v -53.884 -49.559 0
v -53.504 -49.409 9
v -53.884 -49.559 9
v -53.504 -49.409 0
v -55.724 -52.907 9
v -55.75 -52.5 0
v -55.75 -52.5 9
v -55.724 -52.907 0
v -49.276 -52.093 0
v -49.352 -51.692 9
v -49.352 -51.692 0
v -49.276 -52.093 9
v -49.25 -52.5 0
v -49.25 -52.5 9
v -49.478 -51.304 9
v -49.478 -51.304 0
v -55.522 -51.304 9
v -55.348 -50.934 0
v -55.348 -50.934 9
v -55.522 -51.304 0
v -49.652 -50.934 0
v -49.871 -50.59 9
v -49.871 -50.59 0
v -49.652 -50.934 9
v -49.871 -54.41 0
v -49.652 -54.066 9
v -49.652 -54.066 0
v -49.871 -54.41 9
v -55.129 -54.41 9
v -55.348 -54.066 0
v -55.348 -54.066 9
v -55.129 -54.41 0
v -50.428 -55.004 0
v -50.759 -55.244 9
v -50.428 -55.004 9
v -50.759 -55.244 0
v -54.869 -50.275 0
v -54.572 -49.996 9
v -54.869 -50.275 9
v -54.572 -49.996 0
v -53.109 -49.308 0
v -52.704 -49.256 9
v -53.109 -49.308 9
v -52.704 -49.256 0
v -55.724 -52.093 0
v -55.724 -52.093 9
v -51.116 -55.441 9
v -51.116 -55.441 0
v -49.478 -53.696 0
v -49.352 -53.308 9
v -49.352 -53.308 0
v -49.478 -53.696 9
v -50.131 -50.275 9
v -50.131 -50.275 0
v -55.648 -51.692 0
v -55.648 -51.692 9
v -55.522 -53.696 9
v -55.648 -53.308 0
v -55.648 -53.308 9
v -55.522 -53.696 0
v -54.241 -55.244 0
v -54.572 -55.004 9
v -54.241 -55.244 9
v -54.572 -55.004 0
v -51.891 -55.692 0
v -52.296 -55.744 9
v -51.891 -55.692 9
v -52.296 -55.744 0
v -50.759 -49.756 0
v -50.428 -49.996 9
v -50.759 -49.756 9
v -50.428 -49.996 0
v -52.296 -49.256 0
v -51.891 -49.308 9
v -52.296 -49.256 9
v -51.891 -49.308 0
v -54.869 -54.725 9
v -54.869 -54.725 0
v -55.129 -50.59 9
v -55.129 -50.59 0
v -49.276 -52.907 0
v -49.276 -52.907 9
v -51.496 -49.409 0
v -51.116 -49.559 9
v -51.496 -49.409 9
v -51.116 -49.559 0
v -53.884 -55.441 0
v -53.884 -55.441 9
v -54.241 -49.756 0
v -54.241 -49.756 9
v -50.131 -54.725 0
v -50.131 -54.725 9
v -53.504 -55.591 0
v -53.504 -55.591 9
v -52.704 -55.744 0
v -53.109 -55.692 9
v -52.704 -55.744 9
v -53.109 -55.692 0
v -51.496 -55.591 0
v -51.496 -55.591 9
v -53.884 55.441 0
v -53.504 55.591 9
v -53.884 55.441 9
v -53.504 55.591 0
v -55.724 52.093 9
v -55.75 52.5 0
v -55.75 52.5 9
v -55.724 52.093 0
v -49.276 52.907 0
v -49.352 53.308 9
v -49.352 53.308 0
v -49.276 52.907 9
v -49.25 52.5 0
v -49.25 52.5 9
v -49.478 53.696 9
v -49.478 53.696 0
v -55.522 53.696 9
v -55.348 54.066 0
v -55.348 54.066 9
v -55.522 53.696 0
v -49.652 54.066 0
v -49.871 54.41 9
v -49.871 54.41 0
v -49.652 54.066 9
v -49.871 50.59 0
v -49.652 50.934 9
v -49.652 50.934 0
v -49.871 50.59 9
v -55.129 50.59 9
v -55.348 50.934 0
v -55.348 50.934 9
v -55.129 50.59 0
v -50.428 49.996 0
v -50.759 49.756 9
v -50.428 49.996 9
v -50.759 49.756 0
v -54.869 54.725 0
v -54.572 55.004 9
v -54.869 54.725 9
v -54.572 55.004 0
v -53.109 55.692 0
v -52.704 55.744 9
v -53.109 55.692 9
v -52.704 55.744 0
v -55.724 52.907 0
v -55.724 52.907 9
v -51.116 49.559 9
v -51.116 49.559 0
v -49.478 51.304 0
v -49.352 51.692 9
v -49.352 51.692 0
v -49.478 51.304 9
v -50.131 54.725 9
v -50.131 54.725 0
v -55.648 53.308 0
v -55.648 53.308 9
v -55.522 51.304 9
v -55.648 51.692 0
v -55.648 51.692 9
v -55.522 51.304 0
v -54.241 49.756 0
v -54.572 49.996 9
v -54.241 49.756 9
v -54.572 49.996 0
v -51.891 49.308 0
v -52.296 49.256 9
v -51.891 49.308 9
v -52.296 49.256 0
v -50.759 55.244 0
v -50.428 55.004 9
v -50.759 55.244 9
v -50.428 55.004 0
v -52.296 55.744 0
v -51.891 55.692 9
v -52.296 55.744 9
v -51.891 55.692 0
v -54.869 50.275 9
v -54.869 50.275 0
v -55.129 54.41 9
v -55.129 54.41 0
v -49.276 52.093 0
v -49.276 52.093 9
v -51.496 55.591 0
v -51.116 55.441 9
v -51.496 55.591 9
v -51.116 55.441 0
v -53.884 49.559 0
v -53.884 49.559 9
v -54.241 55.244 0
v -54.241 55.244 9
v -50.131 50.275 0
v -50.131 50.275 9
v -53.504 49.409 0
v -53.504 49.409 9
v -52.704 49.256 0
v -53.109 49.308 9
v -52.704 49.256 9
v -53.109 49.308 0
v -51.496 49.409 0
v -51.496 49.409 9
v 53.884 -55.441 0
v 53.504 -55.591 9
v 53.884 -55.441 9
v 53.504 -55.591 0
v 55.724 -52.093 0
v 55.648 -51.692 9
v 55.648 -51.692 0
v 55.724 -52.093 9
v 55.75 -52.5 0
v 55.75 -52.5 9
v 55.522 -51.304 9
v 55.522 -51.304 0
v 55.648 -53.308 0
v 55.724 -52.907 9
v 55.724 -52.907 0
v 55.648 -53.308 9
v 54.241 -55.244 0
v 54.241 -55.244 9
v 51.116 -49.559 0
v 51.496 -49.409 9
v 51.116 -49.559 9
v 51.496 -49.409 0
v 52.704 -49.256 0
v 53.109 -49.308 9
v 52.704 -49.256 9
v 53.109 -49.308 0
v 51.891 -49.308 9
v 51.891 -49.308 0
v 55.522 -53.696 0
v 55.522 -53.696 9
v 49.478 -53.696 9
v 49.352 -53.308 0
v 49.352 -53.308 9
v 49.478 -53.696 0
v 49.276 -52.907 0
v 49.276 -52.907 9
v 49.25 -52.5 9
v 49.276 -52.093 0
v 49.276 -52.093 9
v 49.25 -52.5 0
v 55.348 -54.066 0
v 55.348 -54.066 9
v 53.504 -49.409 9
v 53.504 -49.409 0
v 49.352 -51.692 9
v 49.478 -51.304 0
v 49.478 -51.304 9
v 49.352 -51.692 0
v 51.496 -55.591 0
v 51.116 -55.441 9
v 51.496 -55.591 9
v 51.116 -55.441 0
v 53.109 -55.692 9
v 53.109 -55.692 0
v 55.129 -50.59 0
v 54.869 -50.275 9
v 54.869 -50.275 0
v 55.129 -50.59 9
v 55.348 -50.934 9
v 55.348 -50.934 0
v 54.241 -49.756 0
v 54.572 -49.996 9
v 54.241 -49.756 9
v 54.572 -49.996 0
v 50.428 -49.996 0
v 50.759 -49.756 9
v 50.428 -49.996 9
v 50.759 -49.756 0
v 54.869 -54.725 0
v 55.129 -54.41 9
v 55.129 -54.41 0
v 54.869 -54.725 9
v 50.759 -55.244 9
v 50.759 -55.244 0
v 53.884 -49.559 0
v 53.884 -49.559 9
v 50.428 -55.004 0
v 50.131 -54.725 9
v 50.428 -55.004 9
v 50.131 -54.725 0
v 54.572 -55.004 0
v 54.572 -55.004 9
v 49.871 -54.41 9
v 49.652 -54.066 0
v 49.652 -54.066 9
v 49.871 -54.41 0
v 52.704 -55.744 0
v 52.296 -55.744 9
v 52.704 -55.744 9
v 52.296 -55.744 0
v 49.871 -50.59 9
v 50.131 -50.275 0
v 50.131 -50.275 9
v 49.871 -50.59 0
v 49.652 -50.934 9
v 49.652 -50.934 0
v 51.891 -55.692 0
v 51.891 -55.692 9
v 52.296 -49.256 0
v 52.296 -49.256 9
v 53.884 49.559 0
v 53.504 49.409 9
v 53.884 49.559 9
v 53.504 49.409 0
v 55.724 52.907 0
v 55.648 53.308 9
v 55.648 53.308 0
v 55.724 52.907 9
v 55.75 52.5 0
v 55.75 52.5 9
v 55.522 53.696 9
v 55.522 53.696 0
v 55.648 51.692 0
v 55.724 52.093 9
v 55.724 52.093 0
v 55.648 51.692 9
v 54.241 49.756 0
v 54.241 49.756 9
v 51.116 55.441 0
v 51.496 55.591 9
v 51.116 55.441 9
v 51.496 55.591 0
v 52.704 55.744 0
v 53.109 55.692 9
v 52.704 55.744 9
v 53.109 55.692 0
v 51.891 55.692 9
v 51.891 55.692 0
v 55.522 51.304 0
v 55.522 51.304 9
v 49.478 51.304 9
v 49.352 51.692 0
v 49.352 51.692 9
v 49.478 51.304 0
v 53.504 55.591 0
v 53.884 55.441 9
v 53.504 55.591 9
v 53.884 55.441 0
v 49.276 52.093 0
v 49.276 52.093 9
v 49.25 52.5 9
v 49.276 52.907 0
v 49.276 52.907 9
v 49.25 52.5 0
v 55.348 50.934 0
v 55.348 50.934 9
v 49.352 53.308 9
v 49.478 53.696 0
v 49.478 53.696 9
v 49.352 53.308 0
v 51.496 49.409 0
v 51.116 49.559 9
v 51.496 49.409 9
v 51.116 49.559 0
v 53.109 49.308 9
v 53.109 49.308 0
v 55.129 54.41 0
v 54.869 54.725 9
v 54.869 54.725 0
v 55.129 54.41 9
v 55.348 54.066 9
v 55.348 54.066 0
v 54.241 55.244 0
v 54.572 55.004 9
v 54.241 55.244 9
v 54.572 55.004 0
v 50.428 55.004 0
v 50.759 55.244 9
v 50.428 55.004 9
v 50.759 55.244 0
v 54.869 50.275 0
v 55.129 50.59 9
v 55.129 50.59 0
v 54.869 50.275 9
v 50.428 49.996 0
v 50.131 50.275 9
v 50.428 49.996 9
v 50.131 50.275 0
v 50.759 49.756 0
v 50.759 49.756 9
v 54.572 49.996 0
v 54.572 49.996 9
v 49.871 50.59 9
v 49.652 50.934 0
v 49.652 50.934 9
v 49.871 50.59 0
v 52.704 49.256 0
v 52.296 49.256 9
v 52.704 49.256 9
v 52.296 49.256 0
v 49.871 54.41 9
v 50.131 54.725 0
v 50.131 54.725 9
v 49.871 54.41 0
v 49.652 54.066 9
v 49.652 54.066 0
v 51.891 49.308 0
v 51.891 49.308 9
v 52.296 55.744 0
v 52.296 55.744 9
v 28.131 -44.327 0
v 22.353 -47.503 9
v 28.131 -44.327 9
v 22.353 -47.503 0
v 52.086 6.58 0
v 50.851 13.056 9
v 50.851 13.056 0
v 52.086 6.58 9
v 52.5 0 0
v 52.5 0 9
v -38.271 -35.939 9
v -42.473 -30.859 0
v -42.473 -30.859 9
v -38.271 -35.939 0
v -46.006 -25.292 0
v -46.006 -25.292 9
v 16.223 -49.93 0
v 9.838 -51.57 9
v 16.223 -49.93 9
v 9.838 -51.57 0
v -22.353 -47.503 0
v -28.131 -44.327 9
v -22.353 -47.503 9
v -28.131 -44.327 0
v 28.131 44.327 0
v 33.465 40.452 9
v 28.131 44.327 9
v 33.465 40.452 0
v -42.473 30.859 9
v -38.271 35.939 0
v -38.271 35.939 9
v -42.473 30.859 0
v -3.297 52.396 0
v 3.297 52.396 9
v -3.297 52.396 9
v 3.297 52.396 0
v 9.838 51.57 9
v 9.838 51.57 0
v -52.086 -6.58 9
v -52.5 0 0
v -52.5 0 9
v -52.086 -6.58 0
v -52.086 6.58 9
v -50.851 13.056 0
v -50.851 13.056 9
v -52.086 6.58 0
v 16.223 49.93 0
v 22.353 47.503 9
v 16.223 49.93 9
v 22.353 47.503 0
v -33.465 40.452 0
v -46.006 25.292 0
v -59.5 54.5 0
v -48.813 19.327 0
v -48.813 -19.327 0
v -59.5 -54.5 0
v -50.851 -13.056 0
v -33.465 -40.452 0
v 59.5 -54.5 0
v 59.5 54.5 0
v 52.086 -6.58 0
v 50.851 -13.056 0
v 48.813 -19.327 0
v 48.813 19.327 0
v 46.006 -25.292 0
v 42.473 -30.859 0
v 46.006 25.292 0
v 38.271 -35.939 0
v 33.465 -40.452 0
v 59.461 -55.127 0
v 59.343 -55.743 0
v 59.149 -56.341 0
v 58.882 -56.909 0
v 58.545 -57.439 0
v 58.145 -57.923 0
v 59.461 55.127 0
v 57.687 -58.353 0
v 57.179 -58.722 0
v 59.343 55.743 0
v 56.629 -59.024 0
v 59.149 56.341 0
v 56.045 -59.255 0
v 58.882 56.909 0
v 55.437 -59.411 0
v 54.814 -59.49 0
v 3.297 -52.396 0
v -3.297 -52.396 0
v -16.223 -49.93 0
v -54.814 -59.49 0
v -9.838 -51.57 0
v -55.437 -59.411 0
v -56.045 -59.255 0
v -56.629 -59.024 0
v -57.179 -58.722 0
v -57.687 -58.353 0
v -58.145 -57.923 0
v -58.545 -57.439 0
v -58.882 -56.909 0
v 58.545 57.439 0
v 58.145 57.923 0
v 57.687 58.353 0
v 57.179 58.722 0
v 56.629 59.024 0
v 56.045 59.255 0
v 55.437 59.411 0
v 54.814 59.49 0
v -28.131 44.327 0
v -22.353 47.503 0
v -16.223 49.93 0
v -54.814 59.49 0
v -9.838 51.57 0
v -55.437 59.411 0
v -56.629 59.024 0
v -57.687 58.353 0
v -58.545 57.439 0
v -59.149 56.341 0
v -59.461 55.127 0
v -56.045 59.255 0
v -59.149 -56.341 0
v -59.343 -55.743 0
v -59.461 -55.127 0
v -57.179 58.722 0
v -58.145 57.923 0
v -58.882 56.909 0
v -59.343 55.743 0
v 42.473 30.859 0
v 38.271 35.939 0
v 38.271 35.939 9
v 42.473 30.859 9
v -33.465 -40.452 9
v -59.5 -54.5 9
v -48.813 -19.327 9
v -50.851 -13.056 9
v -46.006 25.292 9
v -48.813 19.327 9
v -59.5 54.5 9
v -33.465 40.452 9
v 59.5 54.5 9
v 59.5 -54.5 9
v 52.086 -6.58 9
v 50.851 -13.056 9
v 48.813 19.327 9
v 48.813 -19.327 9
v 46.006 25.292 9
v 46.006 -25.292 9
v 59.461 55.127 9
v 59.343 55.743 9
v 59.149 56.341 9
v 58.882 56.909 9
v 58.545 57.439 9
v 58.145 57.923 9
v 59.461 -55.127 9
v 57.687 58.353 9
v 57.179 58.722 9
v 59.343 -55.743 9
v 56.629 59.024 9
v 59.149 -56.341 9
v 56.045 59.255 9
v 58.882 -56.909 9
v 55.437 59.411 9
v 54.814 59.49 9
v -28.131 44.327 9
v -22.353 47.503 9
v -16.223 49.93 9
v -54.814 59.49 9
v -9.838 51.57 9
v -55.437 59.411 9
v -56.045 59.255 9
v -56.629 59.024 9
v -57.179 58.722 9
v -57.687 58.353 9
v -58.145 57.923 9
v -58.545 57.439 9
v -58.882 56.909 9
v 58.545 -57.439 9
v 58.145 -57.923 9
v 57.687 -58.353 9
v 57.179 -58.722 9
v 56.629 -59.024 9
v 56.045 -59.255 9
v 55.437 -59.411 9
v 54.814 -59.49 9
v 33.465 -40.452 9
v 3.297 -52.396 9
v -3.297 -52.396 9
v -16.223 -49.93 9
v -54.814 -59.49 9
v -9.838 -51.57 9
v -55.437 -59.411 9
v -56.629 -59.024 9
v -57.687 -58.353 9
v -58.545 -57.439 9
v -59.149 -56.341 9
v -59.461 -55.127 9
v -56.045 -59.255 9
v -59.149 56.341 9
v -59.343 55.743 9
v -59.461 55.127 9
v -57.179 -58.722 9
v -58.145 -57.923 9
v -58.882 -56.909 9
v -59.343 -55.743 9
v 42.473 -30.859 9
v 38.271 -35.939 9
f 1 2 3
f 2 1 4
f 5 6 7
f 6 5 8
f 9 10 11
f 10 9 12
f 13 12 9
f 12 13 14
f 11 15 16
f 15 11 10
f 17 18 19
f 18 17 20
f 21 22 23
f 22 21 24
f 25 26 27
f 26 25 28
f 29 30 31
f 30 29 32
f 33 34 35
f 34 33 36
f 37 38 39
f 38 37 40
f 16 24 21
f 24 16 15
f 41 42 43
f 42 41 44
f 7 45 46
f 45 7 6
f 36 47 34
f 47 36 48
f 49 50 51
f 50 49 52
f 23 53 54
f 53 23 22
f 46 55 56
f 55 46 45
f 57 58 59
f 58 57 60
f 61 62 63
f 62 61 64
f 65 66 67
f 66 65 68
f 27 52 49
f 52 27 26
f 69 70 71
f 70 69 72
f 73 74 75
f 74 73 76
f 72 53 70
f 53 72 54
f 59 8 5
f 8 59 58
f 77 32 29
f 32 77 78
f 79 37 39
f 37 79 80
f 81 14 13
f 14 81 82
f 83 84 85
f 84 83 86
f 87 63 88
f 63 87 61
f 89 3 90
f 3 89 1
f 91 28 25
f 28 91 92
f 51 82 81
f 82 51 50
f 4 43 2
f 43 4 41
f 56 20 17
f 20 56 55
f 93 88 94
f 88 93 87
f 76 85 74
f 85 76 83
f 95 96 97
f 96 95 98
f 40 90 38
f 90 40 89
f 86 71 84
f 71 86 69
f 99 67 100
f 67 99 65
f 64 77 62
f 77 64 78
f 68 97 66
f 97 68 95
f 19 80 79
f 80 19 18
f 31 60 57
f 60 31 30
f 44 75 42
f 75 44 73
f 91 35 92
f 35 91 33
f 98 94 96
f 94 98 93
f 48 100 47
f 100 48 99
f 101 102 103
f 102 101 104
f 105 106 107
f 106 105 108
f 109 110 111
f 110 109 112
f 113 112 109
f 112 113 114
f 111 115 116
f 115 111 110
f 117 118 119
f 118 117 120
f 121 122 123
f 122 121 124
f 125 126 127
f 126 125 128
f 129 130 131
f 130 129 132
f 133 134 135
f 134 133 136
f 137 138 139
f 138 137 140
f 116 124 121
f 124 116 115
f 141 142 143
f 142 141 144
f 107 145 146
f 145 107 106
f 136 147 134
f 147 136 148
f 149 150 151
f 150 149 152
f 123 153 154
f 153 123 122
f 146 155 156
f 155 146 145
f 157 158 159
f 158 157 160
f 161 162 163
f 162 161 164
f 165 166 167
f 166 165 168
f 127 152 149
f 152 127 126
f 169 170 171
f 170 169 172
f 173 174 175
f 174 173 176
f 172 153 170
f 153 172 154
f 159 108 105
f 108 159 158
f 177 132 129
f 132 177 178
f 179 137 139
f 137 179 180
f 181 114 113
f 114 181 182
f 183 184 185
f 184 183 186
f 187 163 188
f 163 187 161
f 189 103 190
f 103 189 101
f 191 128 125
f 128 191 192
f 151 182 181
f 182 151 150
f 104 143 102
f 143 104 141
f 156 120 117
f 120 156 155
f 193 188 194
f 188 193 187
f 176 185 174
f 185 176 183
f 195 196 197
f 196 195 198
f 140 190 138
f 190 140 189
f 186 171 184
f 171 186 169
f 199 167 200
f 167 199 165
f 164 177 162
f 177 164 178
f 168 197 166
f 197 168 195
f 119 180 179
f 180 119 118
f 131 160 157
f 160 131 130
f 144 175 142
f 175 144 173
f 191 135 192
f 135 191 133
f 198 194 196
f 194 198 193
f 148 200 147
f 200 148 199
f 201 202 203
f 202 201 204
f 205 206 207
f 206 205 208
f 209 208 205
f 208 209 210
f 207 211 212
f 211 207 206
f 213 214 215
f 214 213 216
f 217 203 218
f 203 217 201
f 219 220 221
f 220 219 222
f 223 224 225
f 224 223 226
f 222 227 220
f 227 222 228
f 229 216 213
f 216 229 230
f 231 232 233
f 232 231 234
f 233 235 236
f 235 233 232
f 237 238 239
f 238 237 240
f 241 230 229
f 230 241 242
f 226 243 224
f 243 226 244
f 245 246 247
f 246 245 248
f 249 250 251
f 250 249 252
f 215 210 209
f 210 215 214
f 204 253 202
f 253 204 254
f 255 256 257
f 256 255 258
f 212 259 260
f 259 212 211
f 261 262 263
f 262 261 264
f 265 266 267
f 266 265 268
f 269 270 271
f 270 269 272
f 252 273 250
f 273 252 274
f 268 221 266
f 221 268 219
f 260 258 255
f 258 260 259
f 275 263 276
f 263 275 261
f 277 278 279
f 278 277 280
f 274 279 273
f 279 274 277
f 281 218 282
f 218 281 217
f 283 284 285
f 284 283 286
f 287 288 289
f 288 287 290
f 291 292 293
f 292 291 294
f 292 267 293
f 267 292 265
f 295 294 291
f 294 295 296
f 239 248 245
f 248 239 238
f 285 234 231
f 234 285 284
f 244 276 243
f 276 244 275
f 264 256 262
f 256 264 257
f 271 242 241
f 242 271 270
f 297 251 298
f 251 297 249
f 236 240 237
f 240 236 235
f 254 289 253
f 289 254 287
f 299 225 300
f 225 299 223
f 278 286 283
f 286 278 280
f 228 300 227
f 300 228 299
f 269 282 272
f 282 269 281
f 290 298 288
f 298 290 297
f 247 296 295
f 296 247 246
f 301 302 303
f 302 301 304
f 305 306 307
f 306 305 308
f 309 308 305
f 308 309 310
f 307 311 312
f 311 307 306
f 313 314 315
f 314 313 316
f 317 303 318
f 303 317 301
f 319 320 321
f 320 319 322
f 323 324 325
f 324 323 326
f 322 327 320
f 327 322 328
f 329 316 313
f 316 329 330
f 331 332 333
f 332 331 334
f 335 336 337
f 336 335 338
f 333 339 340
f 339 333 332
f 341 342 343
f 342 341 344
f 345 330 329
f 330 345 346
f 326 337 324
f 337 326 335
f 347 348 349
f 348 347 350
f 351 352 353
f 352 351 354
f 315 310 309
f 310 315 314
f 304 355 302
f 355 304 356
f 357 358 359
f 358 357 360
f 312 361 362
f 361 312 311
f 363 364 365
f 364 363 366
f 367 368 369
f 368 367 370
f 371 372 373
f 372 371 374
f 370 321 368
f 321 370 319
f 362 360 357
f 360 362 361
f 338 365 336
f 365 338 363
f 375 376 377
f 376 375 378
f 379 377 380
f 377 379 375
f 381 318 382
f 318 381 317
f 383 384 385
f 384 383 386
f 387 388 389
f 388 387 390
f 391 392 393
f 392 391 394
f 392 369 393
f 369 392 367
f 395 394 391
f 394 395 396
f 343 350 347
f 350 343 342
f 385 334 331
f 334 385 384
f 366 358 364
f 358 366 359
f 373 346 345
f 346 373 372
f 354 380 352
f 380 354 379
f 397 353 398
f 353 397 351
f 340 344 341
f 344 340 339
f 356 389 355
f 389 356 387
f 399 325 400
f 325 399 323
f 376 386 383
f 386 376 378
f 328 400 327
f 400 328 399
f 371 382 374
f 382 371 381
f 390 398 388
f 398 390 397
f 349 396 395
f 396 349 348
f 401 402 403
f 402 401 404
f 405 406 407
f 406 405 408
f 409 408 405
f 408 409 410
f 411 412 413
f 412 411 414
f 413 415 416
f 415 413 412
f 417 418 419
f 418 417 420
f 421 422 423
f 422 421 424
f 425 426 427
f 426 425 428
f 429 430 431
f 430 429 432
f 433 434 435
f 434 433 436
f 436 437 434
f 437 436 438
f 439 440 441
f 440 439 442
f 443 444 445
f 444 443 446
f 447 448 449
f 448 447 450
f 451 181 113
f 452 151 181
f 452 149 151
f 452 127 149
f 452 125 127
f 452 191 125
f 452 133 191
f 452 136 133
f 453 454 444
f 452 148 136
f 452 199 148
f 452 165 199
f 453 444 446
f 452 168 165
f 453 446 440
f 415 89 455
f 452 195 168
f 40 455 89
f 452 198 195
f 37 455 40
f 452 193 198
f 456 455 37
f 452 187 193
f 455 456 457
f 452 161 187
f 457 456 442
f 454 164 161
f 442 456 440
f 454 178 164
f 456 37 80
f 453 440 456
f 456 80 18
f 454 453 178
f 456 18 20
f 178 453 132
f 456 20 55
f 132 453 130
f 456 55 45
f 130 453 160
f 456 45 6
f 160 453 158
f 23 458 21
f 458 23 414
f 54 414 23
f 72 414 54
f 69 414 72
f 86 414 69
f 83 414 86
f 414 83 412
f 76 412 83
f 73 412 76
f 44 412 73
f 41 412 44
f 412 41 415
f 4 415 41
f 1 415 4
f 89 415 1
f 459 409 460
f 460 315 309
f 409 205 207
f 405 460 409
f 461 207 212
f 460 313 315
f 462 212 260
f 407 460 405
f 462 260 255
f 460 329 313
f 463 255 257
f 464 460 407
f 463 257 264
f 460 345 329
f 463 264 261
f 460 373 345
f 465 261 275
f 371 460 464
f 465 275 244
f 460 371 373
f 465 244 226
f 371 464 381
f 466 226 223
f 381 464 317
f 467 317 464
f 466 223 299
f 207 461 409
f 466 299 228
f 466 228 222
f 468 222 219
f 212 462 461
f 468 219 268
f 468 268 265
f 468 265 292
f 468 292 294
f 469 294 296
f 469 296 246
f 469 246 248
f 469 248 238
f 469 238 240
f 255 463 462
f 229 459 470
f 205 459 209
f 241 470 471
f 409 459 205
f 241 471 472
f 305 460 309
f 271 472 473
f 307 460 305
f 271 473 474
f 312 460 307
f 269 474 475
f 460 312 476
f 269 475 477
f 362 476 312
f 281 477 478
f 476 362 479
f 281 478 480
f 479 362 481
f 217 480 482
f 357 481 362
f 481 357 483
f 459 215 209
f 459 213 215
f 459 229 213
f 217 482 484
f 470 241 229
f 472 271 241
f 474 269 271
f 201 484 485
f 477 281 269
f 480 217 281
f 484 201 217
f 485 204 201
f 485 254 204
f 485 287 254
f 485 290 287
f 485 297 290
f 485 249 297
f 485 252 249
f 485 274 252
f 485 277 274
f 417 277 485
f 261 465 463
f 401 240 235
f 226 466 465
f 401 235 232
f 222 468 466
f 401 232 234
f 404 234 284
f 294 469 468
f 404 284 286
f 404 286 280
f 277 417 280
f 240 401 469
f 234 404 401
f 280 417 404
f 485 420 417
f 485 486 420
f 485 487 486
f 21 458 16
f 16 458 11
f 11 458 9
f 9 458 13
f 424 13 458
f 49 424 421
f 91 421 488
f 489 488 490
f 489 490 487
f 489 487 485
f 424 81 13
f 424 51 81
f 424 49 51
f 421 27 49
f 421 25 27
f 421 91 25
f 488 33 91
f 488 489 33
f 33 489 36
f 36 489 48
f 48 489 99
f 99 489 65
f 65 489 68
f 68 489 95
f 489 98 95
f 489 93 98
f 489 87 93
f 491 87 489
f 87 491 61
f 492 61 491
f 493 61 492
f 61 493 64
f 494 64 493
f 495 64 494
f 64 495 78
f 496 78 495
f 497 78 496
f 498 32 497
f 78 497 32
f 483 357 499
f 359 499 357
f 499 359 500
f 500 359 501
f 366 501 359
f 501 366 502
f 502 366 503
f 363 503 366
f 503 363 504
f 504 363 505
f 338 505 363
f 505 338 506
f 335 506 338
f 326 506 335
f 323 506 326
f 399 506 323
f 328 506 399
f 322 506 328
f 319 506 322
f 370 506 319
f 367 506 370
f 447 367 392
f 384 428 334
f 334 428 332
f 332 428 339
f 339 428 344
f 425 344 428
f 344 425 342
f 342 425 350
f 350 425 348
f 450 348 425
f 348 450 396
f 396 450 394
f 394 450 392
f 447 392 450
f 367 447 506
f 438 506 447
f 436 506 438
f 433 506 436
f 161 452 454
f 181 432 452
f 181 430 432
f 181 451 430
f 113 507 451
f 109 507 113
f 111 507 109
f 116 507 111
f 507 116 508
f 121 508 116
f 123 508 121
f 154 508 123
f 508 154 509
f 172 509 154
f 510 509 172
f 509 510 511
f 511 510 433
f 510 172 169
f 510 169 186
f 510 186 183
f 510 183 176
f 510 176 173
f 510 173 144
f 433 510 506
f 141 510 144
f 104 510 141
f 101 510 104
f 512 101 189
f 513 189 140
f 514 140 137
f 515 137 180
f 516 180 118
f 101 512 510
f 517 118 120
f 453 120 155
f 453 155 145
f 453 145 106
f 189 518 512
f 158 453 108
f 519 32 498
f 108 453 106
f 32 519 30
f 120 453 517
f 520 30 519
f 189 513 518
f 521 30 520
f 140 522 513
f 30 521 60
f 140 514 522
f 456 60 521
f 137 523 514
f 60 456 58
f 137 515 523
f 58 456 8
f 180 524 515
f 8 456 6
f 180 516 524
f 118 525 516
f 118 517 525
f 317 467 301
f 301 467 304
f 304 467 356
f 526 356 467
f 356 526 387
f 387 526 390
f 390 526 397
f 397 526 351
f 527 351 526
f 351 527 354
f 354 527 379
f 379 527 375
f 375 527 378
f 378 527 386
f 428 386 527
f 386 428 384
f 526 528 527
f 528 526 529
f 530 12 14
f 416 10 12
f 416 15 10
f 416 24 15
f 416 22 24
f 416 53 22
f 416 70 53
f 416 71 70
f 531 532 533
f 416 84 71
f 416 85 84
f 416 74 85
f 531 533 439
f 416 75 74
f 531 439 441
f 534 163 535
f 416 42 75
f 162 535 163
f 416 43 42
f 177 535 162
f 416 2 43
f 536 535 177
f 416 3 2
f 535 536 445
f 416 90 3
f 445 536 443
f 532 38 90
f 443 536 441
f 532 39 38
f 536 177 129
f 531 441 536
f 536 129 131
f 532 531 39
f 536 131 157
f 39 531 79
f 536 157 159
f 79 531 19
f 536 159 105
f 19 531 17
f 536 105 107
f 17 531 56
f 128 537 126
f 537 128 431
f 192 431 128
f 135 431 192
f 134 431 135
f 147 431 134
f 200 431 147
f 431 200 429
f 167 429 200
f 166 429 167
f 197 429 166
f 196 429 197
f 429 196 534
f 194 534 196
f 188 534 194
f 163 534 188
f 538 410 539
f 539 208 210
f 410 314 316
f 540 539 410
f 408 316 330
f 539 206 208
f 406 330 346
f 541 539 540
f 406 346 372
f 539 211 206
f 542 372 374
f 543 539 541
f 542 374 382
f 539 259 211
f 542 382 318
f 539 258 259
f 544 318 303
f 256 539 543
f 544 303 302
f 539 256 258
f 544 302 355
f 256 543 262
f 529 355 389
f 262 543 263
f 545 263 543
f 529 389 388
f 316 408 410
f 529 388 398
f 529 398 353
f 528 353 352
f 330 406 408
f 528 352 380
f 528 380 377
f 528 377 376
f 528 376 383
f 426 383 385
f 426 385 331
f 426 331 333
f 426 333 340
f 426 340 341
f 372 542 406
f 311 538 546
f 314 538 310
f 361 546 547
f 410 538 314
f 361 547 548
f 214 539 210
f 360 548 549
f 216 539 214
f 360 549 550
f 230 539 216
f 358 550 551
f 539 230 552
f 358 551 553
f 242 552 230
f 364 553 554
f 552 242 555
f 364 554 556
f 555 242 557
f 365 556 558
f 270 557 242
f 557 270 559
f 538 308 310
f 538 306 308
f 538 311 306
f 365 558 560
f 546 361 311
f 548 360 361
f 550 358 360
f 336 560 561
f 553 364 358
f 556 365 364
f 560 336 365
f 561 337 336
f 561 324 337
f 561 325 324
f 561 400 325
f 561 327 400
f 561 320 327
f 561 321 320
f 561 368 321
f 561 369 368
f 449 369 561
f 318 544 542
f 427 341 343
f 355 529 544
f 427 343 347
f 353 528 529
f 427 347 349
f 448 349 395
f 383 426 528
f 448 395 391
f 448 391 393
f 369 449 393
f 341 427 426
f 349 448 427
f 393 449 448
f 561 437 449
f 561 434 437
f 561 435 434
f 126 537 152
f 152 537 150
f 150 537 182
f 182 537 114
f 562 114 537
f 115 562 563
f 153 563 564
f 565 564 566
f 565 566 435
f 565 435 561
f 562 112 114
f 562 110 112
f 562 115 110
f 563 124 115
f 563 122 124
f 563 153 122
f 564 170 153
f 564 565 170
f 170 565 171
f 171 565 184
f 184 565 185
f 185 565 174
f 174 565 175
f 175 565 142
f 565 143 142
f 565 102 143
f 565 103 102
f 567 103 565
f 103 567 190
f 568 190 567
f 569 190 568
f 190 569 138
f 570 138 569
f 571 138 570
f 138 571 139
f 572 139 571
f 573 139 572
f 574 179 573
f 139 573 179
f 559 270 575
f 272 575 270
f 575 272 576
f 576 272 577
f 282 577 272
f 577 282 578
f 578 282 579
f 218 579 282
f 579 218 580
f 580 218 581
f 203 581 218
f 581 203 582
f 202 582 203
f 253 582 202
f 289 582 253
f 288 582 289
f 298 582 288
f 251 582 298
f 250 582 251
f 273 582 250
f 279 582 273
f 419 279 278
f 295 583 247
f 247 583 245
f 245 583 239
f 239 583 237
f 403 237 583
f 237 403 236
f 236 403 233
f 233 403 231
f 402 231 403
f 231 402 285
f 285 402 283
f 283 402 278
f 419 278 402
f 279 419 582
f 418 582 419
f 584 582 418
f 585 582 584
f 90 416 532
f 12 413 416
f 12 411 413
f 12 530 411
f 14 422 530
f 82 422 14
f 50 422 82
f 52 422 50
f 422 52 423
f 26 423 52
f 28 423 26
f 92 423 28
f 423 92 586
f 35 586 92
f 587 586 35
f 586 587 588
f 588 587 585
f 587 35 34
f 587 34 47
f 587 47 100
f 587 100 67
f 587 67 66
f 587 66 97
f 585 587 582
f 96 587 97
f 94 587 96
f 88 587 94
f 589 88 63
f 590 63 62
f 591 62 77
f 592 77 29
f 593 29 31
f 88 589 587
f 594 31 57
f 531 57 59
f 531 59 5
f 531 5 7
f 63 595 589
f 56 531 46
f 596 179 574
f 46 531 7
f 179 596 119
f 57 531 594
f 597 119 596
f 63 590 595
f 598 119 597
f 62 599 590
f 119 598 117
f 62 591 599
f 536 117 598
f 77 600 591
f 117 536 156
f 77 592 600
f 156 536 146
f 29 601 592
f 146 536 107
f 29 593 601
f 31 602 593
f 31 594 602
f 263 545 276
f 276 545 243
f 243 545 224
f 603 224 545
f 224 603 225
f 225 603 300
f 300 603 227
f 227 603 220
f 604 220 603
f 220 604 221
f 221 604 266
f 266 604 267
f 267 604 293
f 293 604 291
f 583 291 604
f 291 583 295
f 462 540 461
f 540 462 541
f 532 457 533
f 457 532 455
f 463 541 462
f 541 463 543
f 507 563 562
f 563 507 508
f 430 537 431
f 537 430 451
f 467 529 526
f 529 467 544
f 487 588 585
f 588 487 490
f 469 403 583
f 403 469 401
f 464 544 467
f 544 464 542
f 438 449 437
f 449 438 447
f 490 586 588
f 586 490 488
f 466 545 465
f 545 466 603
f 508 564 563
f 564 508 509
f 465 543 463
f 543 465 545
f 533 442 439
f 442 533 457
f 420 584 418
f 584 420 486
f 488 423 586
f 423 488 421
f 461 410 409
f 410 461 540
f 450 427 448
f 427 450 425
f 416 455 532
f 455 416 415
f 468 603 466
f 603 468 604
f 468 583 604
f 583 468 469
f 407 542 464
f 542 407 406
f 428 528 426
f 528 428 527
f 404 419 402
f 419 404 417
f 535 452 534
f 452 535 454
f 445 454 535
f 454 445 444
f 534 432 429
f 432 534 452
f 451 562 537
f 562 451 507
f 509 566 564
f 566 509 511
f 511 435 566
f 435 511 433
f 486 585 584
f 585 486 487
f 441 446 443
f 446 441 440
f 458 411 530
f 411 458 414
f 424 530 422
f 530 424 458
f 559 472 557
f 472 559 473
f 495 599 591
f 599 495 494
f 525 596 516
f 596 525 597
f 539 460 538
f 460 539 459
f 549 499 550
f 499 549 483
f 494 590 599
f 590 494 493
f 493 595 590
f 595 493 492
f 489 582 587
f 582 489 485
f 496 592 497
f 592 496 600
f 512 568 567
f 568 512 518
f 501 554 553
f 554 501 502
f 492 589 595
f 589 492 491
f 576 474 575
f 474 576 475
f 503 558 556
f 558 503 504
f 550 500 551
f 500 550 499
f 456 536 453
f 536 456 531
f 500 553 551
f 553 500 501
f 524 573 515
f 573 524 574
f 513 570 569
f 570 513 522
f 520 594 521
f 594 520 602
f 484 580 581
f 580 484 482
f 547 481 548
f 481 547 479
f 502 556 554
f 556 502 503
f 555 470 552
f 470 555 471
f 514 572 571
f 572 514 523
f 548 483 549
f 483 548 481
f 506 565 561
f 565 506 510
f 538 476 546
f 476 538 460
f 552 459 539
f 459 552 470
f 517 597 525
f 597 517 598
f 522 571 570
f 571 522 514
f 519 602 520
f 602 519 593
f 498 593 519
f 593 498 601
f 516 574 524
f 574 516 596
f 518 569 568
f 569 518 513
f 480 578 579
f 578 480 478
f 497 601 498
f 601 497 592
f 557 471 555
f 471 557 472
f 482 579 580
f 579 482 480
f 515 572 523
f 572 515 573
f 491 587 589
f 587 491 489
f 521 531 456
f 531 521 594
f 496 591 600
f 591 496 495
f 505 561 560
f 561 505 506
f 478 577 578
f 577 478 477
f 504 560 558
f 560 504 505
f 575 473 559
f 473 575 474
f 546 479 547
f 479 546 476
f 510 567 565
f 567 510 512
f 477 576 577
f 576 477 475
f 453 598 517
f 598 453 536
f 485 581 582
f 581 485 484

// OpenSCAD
$fn = 50;

difference() {
	union() {
		hull() {
			translate(v = [-54.5, 54.5, 0]) {
				cylinder(h = 9, r = 5);
			}
			translate(v = [54.5, 54.5, 0]) {
				cylinder(h = 9, r = 5);
			}
			translate(v = [-54.5, -54.5, 0]) {
				cylinder(h = 9, r = 5);
			}
			translate(v = [54.5, -54.5, 0]) {
				cylinder(h = 9, r = 5);
			}
		}
	}
	union() {
		translate(v = [-52.5, -52.5, -100.0]) {
			cylinder(h = 200, r = 3.25);
		}
		translate(v = [-52.5, 52.5, -100.0]) {
			cylinder(h = 200, r = 3.25);
		}
		translate(v = [52.5, -52.5, -100.0]) {
			cylinder(h = 200, r = 3.25);
		}
		translate(v = [52.5, 52.5, -100.0]) {
			cylinder(h = 200, r = 3.25);
		}
		translate(v = [-52.5, -52.5, -100.0]) {
			cylinder(h = 200, r = 1.8);
		}
		translate(v = [-52.5, 52.5, -100.0]) {
			cylinder(h = 200, r = 1.8);
		}
		translate(v = [52.5, -52.5, -100.0]) {
			cylinder(h = 200, r = 1.8);
		}
		translate(v = [52.5, 52.5, -100.0]) {
			cylinder(h = 200, r = 1.8);
		}
		cylinder(h = 9, r = 52.5);
	}
}
